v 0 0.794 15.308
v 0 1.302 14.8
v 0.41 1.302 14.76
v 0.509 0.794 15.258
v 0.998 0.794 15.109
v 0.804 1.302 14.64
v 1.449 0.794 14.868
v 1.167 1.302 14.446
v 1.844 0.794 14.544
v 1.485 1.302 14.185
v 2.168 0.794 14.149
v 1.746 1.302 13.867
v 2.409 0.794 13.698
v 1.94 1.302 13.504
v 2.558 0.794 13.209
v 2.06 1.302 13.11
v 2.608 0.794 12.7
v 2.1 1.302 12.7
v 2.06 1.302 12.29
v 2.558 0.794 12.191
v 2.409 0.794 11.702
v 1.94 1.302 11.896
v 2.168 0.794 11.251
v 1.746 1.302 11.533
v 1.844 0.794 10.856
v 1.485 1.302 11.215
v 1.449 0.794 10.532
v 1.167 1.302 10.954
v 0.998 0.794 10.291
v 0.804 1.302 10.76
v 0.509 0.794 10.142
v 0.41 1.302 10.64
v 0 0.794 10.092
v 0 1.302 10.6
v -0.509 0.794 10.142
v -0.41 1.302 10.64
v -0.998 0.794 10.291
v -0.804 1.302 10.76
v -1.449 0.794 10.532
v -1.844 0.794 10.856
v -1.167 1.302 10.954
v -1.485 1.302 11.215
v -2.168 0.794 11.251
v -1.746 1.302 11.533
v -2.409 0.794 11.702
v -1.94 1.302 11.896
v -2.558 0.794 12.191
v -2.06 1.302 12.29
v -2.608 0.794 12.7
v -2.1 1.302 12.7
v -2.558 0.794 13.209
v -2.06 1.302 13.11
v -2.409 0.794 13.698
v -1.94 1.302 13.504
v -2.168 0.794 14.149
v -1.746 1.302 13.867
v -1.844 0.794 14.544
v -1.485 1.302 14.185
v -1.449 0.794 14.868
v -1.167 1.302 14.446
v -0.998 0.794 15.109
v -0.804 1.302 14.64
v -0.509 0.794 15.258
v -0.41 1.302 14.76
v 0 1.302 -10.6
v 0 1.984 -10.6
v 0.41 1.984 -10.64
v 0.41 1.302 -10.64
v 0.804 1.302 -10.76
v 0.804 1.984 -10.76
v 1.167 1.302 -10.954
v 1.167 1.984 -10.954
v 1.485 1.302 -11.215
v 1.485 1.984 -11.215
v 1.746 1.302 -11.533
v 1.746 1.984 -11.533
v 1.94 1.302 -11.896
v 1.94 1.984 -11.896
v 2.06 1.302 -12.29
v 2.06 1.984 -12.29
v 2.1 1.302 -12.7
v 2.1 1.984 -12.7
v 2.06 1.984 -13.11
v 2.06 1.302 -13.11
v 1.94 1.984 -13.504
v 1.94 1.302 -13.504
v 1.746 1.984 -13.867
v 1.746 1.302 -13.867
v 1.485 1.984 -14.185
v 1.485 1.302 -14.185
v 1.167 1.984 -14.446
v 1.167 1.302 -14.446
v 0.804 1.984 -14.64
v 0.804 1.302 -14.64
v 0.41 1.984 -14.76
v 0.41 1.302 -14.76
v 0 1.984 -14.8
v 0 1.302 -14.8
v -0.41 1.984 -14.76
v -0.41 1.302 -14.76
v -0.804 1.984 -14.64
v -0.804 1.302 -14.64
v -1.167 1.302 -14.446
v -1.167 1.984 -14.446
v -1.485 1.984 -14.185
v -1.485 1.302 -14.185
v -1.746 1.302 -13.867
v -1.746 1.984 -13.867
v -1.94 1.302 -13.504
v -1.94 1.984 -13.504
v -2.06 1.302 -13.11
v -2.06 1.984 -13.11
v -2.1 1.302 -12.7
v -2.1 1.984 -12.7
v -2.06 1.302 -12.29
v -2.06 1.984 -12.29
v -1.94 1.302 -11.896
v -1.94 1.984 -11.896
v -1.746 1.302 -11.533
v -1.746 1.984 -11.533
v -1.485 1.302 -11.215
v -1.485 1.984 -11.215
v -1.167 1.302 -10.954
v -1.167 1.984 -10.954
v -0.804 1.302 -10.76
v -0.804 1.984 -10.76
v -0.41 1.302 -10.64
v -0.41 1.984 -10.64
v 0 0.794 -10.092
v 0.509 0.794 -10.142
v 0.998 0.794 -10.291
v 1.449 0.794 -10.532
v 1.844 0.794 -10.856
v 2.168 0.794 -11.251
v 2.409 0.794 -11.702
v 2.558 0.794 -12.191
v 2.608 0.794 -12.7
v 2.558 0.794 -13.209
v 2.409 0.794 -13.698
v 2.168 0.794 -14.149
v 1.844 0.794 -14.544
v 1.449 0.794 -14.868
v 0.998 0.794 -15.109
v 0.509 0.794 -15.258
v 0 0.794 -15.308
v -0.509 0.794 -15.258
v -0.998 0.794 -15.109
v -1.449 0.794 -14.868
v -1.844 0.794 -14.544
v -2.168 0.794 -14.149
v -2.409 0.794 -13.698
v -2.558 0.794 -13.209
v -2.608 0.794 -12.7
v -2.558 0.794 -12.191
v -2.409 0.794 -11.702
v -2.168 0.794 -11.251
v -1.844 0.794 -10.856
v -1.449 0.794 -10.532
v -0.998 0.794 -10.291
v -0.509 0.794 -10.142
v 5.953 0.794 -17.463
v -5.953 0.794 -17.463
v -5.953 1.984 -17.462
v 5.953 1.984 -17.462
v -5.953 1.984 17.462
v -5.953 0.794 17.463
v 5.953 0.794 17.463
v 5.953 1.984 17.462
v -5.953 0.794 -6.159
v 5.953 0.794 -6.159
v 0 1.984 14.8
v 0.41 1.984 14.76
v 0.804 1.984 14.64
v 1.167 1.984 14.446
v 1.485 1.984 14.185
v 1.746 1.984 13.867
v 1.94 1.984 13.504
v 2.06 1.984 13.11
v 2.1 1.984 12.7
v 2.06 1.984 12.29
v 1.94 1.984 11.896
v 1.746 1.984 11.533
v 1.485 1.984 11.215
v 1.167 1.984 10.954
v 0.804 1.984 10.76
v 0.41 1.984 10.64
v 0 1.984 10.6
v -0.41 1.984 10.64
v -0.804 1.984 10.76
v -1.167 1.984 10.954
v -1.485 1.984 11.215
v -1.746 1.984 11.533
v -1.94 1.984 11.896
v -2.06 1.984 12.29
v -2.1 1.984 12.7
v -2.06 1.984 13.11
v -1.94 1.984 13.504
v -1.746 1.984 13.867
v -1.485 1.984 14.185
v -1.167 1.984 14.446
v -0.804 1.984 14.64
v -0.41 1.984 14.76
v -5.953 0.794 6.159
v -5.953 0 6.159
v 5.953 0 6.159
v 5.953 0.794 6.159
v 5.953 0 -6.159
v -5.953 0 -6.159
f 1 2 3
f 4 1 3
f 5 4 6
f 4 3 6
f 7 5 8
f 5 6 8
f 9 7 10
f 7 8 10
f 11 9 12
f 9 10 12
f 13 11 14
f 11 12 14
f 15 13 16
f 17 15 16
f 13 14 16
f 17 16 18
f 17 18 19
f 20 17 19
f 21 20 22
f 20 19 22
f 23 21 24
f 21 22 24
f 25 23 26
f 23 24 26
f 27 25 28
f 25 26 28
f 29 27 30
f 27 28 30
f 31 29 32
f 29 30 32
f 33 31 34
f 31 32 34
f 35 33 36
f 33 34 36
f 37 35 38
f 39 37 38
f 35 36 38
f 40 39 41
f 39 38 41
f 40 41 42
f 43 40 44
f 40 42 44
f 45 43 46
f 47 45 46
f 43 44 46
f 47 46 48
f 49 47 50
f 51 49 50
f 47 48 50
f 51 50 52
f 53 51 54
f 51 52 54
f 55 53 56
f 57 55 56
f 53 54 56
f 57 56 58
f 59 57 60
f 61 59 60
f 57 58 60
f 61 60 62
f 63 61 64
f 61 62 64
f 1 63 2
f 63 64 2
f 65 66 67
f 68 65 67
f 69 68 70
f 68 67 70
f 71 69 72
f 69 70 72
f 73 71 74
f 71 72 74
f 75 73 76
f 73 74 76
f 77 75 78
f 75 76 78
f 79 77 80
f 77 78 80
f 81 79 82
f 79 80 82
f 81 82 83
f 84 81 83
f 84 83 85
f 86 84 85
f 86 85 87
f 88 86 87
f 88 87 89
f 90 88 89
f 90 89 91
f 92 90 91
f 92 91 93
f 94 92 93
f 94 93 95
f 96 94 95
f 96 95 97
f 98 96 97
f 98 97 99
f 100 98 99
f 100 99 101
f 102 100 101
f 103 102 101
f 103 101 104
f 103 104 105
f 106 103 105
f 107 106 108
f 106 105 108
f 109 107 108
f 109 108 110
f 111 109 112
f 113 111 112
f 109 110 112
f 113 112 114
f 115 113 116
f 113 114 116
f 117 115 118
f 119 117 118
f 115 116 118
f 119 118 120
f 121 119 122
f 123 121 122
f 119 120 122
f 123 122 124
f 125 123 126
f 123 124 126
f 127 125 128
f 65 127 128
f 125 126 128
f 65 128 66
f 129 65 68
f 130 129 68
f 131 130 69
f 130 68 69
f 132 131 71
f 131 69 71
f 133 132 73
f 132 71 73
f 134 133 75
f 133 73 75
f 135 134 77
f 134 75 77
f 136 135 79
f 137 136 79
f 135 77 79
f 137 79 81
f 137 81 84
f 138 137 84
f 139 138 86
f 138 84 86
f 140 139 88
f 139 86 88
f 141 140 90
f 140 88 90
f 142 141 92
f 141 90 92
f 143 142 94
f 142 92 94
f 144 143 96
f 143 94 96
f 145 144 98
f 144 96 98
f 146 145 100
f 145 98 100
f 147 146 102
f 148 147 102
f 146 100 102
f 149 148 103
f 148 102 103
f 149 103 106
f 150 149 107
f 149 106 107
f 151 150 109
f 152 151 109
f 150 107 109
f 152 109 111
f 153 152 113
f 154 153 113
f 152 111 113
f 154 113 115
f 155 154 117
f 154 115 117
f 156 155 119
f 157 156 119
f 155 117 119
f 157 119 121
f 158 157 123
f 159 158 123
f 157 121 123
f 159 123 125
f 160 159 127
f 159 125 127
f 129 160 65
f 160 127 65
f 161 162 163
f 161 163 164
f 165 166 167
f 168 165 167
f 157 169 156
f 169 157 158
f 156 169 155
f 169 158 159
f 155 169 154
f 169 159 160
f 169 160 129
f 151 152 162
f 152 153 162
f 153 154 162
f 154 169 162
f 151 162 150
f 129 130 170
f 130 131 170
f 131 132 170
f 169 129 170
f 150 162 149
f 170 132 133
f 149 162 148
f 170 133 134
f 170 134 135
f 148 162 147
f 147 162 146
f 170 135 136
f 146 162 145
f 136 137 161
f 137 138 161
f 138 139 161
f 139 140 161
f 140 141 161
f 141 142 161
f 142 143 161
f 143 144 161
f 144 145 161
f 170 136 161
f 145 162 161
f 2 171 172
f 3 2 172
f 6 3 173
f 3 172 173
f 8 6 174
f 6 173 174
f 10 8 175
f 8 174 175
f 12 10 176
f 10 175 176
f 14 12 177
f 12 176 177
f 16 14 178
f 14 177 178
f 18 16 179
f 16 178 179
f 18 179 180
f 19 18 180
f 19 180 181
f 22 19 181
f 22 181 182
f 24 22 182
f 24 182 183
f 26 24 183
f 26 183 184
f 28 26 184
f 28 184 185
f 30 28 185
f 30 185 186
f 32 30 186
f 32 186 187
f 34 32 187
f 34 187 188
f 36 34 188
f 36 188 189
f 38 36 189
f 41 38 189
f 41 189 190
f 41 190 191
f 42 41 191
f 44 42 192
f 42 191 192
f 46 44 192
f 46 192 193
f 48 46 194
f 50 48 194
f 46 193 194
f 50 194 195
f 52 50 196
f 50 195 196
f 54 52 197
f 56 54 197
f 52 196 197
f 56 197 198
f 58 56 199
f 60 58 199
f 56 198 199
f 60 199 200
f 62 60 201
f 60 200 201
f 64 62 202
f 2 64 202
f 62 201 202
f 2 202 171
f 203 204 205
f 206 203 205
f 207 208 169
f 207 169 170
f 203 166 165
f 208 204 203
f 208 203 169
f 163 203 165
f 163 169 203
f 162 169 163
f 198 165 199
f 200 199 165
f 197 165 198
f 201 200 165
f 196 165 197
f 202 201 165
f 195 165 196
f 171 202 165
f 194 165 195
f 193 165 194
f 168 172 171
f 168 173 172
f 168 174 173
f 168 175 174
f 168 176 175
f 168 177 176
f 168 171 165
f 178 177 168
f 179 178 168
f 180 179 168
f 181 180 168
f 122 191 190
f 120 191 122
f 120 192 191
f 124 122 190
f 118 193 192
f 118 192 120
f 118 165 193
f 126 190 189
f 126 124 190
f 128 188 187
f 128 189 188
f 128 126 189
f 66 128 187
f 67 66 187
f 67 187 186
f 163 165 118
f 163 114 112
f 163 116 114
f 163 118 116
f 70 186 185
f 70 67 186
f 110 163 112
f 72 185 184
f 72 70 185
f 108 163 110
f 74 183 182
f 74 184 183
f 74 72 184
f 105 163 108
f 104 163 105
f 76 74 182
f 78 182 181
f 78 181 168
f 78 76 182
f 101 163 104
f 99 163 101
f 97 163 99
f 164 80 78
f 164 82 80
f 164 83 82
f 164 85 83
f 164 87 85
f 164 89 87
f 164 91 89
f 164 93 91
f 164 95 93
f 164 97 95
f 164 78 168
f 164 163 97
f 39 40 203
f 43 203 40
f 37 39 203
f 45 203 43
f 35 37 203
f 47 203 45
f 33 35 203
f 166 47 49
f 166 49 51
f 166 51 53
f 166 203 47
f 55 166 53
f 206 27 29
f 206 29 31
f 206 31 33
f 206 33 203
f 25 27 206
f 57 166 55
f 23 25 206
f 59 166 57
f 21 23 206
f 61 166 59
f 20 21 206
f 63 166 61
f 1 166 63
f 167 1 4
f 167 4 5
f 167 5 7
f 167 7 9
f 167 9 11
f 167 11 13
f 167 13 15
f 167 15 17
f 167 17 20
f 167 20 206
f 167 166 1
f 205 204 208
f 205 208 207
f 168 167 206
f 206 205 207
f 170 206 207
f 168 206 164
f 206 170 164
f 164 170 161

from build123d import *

# Parameters (mm, degrees)
SKETCH1_W      = 11.90625
SKETCH1_H      = 34.925
EXTRUDE1_DEPTH = 1.984375
SKETCH4_W      = 11.90625
SKETCH4_H      = 11.303912273
EXTRUDE3_DEPTH = 0.79375
SKETCH2_R      = 2.1
EXTRUDE2_DEPTH = 1.984375
CHAMFER1_SIZE  = 0.508


with BuildPart() as part:
    # Sketch1 → Extrude1 (new body)
    with BuildSketch(Plane(origin=(0, 0, 0), x_dir=(1, 0, 0), z_dir=(0, 1, 0))):
        Rectangle(SKETCH1_W, SKETCH1_H)
    extrude(amount=EXTRUDE1_DEPTH)

    # Sketch4 → Extrude3 (cut)
    with BuildSketch(Plane.XZ):
        with Locations((0, 11.810543864)):
            Rectangle(SKETCH4_W, SKETCH4_H)
    extrude3 = extrude(amount=-EXTRUDE3_DEPTH, mode=Mode.SUBTRACT)

    # Mirror1: Extrude3 across plane
    add(extrude3.mirror(Plane.XY), mode=Mode.SUBTRACT)

    # Sketch2 → Extrude2 (cut)
    with BuildSketch(Plane(origin=(0, 1.984375, 0), x_dir=(1, 0, 0), z_dir=(0, 1, 0))):
        with Locations(Location((0, 12.7, 0), (0, 0, 270))):
            Circle(SKETCH2_R)
        with Locations(Location((0, -12.7, 0), (0, 0, 270))):
            Circle(SKETCH2_R)
    extrude(amount=-EXTRUDE2_DEPTH, mode=Mode.SUBTRACT)

    # Chamfer1
    chamfer1_edges = [part.edges().sort_by_distance(p)[0] for p in [
        (0, 0.79375, -14.8),
        (0, 0.79375, 10.6),
    ]]
    chamfer(chamfer1_edges, length=CHAMFER1_SIZE)


solid = part.part
